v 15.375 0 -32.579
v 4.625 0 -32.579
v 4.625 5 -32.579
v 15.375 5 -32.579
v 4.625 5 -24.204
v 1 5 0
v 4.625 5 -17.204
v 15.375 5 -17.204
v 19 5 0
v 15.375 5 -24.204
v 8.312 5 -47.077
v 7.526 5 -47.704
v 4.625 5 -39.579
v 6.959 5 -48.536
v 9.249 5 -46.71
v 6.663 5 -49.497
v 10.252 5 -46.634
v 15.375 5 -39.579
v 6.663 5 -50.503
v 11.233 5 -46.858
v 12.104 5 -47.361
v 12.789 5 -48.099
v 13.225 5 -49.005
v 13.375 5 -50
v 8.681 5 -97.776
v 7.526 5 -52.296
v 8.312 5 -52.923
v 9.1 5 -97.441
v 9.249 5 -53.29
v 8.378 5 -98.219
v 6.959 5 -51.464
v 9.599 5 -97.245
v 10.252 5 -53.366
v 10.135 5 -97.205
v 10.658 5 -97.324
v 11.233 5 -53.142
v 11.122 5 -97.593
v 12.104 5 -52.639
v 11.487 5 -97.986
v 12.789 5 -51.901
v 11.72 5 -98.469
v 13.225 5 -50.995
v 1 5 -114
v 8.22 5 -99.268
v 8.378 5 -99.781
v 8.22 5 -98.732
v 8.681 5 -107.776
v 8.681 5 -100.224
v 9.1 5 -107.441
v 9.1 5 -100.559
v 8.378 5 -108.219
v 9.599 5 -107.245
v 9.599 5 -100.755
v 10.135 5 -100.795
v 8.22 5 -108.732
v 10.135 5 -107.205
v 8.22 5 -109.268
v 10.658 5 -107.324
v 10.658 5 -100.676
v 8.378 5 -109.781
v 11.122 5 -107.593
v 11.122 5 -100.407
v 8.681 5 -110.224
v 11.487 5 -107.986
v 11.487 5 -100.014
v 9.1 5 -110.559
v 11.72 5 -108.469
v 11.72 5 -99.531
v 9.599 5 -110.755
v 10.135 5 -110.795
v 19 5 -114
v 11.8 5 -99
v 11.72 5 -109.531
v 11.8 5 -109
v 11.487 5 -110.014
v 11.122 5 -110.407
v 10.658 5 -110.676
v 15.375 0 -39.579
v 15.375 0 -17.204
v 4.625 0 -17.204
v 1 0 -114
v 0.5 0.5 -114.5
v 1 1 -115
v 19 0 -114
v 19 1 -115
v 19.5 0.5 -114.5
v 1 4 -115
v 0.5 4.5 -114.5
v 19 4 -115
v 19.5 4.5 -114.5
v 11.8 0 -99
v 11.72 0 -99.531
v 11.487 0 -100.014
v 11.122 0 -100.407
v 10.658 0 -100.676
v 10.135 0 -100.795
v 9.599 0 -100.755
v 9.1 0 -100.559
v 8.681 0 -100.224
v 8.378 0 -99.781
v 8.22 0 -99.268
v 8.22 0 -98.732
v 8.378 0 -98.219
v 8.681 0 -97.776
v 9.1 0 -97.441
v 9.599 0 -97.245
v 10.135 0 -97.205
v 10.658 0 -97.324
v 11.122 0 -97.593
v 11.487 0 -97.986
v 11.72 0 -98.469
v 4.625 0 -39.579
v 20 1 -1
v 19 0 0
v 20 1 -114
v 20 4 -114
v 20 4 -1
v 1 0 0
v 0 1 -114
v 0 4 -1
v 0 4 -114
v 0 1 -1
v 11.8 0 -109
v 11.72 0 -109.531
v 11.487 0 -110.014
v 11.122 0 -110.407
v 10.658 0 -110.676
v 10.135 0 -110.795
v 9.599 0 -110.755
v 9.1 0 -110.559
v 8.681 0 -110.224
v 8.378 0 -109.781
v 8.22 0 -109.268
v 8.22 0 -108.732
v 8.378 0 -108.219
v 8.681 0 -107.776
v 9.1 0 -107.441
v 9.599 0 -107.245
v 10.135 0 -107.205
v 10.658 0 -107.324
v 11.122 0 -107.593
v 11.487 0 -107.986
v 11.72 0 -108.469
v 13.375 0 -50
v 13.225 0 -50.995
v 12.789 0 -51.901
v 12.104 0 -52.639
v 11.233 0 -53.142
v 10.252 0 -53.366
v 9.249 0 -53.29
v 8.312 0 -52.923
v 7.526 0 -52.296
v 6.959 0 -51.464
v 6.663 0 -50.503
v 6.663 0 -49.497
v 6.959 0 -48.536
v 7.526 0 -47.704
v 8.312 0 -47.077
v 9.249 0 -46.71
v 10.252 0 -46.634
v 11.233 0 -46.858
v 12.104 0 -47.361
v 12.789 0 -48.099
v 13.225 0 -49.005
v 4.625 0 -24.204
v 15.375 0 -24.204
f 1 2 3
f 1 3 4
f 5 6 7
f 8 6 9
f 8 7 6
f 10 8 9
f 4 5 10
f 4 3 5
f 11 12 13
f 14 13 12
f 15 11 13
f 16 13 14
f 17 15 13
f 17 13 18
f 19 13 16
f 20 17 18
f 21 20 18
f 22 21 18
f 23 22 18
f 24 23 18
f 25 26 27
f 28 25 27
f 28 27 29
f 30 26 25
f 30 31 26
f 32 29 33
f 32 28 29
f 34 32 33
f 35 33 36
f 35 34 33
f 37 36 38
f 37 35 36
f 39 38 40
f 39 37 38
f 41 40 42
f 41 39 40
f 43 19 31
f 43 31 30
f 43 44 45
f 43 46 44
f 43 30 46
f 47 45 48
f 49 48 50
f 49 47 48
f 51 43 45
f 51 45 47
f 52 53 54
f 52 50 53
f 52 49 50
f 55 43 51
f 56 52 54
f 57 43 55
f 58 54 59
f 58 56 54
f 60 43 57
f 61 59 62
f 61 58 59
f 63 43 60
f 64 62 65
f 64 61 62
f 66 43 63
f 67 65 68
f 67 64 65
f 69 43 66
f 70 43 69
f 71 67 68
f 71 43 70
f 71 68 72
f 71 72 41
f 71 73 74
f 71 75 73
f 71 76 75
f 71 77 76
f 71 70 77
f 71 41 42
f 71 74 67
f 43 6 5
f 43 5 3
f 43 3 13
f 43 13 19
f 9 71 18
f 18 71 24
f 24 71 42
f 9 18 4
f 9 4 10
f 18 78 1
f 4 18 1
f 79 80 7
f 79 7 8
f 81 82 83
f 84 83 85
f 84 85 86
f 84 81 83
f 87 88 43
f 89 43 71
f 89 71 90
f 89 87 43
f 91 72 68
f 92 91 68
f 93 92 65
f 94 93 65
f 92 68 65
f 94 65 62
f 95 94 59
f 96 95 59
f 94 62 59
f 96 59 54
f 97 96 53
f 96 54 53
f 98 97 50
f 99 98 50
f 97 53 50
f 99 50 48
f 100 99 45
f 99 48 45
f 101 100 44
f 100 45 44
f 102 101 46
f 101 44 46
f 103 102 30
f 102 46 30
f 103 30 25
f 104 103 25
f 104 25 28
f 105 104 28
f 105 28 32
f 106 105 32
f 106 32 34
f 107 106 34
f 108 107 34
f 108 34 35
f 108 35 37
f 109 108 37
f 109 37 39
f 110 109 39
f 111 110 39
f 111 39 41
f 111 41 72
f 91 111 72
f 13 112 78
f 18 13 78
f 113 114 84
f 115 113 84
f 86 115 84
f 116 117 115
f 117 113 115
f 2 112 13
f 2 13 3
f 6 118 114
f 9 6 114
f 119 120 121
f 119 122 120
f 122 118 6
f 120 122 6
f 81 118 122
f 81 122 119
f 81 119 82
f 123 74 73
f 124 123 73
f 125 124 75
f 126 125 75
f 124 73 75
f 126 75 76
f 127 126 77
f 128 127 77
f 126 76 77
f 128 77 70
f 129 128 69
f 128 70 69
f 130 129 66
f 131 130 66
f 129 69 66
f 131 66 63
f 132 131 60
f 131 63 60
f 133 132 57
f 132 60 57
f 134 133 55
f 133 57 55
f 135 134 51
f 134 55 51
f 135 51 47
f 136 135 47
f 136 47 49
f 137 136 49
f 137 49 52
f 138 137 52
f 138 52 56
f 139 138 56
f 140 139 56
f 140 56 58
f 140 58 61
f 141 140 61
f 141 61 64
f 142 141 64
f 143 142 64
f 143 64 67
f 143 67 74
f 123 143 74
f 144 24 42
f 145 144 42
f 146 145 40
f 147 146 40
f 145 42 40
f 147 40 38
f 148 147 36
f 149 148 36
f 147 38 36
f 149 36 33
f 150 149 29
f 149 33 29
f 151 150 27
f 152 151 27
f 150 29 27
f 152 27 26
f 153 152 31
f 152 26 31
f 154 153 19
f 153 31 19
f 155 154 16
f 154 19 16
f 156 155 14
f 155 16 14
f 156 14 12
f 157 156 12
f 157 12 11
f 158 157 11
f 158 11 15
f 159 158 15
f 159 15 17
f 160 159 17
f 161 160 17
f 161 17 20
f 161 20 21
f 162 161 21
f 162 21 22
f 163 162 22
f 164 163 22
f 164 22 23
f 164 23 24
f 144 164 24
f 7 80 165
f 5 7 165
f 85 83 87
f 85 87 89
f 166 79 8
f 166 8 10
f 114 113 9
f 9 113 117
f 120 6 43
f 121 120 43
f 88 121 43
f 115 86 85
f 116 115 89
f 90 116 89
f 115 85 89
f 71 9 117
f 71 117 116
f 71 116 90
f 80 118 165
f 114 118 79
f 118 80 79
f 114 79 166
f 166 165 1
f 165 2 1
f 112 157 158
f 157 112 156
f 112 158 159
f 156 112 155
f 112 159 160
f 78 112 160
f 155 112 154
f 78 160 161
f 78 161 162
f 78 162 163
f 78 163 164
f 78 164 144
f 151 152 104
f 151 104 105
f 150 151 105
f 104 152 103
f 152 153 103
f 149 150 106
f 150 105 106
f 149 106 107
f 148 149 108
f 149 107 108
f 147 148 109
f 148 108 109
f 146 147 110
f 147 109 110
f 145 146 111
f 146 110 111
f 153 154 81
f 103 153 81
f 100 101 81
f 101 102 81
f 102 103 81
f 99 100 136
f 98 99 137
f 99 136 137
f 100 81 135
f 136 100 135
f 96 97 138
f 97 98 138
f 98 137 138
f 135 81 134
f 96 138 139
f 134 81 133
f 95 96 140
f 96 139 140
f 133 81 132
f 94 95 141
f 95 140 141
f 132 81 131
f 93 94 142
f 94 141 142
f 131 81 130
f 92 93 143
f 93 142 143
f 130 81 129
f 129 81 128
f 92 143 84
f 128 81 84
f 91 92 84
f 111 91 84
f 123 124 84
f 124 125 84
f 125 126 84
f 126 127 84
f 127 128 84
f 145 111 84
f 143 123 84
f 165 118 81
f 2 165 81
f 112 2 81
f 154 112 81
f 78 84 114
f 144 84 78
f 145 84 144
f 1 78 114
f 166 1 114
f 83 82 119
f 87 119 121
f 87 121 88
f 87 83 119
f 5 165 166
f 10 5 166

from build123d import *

# Parameters (mm, degrees)
SKETCH1_W                = 20
SKETCH1_H                = 115
BOSS_EXTRUDE1_DEPTH      = 5
CHAMFER1_SIZE            = 1
CHAMFER2_SIZE            = 1
M3_CLEARANCE_HOLE6_D     = 3.6
M3_CLEARANCE_HOLE6_DEPTH = 5
SKETCH19_W               = 10.75
SKETCH19_H               = 7
CUT_EXTRUDE3_DEPTH       = 6
SKETCH20_R               = 3.375
CUT_EXTRUDE4_DEPTH       = 10


with BuildPart() as part:
    # Sketch1 → Boss-Extrude1 (new body)
    with BuildSketch(Plane(origin=(0, 0, 0), x_dir=(1, 0, 0), z_dir=(0, 1, 0))):
        with Locations((10, 57.5)):
            Rectangle(SKETCH1_W, SKETCH1_H)
    extrude(amount=BOSS_EXTRUDE1_DEPTH)

    # Chamfer1
    chamfer1_edges = [part.edges().sort_by_distance(p)[0] for p in [
        (20, 5, -57.5),
        (0, 5, -57.5),
        (20, 0, -57.5),
        (0, 0, -57.5),
        (0, 2.5, -115),
        (20, 2.5, -115),
        (20, 2.5, 0),
        (0, 2.5, 0),
    ]]
    chamfer(chamfer1_edges, length=CHAMFER1_SIZE)

    # Chamfer2
    chamfer2_edges = [part.edges().sort_by_distance(p)[0] for p in [
        (10, 5, -115),
        (10, 0, -115),
    ]]
    chamfer(chamfer2_edges, length=CHAMFER2_SIZE)

    # M3 Clearance Hole6
    with Locations(Plane(origin=(0, 0, 0), x_dir=(-1, 0, 0), z_dir=(0, -1, 0))):
        with Locations((-10, 109), (-10, 99)):
            Hole(M3_CLEARANCE_HOLE6_D / 2, depth=M3_CLEARANCE_HOLE6_DEPTH)

    # Sketch19 → Cut-Extrude3 (cut, through all)
    with BuildSketch(Plane(origin=(0, 0, 0), x_dir=(1, 0, 0), z_dir=(0, 1, 0))):
        with Locations((10, 20.704322589)):
            Rectangle(SKETCH19_W, SKETCH19_H)
    cut_extrude3 = extrude(amount=CUT_EXTRUDE3_DEPTH, mode=Mode.SUBTRACT)

    # Mirror1: Cut-Extrude3 across plane
    add(cut_extrude3.mirror(Plane.XY.offset(-28.391822589)), mode=Mode.SUBTRACT)

    # Sketch20 → Cut-Extrude4 (cut)
    with BuildSketch(Plane(origin=(0, 5, 0), x_dir=(1, 0, 0), z_dir=(0, 1, 0))):
        with Locations((10, 50)):
            Circle(SKETCH20_R)
    extrude(amount=-CUT_EXTRUDE4_DEPTH, mode=Mode.SUBTRACT)


solid = part.part
